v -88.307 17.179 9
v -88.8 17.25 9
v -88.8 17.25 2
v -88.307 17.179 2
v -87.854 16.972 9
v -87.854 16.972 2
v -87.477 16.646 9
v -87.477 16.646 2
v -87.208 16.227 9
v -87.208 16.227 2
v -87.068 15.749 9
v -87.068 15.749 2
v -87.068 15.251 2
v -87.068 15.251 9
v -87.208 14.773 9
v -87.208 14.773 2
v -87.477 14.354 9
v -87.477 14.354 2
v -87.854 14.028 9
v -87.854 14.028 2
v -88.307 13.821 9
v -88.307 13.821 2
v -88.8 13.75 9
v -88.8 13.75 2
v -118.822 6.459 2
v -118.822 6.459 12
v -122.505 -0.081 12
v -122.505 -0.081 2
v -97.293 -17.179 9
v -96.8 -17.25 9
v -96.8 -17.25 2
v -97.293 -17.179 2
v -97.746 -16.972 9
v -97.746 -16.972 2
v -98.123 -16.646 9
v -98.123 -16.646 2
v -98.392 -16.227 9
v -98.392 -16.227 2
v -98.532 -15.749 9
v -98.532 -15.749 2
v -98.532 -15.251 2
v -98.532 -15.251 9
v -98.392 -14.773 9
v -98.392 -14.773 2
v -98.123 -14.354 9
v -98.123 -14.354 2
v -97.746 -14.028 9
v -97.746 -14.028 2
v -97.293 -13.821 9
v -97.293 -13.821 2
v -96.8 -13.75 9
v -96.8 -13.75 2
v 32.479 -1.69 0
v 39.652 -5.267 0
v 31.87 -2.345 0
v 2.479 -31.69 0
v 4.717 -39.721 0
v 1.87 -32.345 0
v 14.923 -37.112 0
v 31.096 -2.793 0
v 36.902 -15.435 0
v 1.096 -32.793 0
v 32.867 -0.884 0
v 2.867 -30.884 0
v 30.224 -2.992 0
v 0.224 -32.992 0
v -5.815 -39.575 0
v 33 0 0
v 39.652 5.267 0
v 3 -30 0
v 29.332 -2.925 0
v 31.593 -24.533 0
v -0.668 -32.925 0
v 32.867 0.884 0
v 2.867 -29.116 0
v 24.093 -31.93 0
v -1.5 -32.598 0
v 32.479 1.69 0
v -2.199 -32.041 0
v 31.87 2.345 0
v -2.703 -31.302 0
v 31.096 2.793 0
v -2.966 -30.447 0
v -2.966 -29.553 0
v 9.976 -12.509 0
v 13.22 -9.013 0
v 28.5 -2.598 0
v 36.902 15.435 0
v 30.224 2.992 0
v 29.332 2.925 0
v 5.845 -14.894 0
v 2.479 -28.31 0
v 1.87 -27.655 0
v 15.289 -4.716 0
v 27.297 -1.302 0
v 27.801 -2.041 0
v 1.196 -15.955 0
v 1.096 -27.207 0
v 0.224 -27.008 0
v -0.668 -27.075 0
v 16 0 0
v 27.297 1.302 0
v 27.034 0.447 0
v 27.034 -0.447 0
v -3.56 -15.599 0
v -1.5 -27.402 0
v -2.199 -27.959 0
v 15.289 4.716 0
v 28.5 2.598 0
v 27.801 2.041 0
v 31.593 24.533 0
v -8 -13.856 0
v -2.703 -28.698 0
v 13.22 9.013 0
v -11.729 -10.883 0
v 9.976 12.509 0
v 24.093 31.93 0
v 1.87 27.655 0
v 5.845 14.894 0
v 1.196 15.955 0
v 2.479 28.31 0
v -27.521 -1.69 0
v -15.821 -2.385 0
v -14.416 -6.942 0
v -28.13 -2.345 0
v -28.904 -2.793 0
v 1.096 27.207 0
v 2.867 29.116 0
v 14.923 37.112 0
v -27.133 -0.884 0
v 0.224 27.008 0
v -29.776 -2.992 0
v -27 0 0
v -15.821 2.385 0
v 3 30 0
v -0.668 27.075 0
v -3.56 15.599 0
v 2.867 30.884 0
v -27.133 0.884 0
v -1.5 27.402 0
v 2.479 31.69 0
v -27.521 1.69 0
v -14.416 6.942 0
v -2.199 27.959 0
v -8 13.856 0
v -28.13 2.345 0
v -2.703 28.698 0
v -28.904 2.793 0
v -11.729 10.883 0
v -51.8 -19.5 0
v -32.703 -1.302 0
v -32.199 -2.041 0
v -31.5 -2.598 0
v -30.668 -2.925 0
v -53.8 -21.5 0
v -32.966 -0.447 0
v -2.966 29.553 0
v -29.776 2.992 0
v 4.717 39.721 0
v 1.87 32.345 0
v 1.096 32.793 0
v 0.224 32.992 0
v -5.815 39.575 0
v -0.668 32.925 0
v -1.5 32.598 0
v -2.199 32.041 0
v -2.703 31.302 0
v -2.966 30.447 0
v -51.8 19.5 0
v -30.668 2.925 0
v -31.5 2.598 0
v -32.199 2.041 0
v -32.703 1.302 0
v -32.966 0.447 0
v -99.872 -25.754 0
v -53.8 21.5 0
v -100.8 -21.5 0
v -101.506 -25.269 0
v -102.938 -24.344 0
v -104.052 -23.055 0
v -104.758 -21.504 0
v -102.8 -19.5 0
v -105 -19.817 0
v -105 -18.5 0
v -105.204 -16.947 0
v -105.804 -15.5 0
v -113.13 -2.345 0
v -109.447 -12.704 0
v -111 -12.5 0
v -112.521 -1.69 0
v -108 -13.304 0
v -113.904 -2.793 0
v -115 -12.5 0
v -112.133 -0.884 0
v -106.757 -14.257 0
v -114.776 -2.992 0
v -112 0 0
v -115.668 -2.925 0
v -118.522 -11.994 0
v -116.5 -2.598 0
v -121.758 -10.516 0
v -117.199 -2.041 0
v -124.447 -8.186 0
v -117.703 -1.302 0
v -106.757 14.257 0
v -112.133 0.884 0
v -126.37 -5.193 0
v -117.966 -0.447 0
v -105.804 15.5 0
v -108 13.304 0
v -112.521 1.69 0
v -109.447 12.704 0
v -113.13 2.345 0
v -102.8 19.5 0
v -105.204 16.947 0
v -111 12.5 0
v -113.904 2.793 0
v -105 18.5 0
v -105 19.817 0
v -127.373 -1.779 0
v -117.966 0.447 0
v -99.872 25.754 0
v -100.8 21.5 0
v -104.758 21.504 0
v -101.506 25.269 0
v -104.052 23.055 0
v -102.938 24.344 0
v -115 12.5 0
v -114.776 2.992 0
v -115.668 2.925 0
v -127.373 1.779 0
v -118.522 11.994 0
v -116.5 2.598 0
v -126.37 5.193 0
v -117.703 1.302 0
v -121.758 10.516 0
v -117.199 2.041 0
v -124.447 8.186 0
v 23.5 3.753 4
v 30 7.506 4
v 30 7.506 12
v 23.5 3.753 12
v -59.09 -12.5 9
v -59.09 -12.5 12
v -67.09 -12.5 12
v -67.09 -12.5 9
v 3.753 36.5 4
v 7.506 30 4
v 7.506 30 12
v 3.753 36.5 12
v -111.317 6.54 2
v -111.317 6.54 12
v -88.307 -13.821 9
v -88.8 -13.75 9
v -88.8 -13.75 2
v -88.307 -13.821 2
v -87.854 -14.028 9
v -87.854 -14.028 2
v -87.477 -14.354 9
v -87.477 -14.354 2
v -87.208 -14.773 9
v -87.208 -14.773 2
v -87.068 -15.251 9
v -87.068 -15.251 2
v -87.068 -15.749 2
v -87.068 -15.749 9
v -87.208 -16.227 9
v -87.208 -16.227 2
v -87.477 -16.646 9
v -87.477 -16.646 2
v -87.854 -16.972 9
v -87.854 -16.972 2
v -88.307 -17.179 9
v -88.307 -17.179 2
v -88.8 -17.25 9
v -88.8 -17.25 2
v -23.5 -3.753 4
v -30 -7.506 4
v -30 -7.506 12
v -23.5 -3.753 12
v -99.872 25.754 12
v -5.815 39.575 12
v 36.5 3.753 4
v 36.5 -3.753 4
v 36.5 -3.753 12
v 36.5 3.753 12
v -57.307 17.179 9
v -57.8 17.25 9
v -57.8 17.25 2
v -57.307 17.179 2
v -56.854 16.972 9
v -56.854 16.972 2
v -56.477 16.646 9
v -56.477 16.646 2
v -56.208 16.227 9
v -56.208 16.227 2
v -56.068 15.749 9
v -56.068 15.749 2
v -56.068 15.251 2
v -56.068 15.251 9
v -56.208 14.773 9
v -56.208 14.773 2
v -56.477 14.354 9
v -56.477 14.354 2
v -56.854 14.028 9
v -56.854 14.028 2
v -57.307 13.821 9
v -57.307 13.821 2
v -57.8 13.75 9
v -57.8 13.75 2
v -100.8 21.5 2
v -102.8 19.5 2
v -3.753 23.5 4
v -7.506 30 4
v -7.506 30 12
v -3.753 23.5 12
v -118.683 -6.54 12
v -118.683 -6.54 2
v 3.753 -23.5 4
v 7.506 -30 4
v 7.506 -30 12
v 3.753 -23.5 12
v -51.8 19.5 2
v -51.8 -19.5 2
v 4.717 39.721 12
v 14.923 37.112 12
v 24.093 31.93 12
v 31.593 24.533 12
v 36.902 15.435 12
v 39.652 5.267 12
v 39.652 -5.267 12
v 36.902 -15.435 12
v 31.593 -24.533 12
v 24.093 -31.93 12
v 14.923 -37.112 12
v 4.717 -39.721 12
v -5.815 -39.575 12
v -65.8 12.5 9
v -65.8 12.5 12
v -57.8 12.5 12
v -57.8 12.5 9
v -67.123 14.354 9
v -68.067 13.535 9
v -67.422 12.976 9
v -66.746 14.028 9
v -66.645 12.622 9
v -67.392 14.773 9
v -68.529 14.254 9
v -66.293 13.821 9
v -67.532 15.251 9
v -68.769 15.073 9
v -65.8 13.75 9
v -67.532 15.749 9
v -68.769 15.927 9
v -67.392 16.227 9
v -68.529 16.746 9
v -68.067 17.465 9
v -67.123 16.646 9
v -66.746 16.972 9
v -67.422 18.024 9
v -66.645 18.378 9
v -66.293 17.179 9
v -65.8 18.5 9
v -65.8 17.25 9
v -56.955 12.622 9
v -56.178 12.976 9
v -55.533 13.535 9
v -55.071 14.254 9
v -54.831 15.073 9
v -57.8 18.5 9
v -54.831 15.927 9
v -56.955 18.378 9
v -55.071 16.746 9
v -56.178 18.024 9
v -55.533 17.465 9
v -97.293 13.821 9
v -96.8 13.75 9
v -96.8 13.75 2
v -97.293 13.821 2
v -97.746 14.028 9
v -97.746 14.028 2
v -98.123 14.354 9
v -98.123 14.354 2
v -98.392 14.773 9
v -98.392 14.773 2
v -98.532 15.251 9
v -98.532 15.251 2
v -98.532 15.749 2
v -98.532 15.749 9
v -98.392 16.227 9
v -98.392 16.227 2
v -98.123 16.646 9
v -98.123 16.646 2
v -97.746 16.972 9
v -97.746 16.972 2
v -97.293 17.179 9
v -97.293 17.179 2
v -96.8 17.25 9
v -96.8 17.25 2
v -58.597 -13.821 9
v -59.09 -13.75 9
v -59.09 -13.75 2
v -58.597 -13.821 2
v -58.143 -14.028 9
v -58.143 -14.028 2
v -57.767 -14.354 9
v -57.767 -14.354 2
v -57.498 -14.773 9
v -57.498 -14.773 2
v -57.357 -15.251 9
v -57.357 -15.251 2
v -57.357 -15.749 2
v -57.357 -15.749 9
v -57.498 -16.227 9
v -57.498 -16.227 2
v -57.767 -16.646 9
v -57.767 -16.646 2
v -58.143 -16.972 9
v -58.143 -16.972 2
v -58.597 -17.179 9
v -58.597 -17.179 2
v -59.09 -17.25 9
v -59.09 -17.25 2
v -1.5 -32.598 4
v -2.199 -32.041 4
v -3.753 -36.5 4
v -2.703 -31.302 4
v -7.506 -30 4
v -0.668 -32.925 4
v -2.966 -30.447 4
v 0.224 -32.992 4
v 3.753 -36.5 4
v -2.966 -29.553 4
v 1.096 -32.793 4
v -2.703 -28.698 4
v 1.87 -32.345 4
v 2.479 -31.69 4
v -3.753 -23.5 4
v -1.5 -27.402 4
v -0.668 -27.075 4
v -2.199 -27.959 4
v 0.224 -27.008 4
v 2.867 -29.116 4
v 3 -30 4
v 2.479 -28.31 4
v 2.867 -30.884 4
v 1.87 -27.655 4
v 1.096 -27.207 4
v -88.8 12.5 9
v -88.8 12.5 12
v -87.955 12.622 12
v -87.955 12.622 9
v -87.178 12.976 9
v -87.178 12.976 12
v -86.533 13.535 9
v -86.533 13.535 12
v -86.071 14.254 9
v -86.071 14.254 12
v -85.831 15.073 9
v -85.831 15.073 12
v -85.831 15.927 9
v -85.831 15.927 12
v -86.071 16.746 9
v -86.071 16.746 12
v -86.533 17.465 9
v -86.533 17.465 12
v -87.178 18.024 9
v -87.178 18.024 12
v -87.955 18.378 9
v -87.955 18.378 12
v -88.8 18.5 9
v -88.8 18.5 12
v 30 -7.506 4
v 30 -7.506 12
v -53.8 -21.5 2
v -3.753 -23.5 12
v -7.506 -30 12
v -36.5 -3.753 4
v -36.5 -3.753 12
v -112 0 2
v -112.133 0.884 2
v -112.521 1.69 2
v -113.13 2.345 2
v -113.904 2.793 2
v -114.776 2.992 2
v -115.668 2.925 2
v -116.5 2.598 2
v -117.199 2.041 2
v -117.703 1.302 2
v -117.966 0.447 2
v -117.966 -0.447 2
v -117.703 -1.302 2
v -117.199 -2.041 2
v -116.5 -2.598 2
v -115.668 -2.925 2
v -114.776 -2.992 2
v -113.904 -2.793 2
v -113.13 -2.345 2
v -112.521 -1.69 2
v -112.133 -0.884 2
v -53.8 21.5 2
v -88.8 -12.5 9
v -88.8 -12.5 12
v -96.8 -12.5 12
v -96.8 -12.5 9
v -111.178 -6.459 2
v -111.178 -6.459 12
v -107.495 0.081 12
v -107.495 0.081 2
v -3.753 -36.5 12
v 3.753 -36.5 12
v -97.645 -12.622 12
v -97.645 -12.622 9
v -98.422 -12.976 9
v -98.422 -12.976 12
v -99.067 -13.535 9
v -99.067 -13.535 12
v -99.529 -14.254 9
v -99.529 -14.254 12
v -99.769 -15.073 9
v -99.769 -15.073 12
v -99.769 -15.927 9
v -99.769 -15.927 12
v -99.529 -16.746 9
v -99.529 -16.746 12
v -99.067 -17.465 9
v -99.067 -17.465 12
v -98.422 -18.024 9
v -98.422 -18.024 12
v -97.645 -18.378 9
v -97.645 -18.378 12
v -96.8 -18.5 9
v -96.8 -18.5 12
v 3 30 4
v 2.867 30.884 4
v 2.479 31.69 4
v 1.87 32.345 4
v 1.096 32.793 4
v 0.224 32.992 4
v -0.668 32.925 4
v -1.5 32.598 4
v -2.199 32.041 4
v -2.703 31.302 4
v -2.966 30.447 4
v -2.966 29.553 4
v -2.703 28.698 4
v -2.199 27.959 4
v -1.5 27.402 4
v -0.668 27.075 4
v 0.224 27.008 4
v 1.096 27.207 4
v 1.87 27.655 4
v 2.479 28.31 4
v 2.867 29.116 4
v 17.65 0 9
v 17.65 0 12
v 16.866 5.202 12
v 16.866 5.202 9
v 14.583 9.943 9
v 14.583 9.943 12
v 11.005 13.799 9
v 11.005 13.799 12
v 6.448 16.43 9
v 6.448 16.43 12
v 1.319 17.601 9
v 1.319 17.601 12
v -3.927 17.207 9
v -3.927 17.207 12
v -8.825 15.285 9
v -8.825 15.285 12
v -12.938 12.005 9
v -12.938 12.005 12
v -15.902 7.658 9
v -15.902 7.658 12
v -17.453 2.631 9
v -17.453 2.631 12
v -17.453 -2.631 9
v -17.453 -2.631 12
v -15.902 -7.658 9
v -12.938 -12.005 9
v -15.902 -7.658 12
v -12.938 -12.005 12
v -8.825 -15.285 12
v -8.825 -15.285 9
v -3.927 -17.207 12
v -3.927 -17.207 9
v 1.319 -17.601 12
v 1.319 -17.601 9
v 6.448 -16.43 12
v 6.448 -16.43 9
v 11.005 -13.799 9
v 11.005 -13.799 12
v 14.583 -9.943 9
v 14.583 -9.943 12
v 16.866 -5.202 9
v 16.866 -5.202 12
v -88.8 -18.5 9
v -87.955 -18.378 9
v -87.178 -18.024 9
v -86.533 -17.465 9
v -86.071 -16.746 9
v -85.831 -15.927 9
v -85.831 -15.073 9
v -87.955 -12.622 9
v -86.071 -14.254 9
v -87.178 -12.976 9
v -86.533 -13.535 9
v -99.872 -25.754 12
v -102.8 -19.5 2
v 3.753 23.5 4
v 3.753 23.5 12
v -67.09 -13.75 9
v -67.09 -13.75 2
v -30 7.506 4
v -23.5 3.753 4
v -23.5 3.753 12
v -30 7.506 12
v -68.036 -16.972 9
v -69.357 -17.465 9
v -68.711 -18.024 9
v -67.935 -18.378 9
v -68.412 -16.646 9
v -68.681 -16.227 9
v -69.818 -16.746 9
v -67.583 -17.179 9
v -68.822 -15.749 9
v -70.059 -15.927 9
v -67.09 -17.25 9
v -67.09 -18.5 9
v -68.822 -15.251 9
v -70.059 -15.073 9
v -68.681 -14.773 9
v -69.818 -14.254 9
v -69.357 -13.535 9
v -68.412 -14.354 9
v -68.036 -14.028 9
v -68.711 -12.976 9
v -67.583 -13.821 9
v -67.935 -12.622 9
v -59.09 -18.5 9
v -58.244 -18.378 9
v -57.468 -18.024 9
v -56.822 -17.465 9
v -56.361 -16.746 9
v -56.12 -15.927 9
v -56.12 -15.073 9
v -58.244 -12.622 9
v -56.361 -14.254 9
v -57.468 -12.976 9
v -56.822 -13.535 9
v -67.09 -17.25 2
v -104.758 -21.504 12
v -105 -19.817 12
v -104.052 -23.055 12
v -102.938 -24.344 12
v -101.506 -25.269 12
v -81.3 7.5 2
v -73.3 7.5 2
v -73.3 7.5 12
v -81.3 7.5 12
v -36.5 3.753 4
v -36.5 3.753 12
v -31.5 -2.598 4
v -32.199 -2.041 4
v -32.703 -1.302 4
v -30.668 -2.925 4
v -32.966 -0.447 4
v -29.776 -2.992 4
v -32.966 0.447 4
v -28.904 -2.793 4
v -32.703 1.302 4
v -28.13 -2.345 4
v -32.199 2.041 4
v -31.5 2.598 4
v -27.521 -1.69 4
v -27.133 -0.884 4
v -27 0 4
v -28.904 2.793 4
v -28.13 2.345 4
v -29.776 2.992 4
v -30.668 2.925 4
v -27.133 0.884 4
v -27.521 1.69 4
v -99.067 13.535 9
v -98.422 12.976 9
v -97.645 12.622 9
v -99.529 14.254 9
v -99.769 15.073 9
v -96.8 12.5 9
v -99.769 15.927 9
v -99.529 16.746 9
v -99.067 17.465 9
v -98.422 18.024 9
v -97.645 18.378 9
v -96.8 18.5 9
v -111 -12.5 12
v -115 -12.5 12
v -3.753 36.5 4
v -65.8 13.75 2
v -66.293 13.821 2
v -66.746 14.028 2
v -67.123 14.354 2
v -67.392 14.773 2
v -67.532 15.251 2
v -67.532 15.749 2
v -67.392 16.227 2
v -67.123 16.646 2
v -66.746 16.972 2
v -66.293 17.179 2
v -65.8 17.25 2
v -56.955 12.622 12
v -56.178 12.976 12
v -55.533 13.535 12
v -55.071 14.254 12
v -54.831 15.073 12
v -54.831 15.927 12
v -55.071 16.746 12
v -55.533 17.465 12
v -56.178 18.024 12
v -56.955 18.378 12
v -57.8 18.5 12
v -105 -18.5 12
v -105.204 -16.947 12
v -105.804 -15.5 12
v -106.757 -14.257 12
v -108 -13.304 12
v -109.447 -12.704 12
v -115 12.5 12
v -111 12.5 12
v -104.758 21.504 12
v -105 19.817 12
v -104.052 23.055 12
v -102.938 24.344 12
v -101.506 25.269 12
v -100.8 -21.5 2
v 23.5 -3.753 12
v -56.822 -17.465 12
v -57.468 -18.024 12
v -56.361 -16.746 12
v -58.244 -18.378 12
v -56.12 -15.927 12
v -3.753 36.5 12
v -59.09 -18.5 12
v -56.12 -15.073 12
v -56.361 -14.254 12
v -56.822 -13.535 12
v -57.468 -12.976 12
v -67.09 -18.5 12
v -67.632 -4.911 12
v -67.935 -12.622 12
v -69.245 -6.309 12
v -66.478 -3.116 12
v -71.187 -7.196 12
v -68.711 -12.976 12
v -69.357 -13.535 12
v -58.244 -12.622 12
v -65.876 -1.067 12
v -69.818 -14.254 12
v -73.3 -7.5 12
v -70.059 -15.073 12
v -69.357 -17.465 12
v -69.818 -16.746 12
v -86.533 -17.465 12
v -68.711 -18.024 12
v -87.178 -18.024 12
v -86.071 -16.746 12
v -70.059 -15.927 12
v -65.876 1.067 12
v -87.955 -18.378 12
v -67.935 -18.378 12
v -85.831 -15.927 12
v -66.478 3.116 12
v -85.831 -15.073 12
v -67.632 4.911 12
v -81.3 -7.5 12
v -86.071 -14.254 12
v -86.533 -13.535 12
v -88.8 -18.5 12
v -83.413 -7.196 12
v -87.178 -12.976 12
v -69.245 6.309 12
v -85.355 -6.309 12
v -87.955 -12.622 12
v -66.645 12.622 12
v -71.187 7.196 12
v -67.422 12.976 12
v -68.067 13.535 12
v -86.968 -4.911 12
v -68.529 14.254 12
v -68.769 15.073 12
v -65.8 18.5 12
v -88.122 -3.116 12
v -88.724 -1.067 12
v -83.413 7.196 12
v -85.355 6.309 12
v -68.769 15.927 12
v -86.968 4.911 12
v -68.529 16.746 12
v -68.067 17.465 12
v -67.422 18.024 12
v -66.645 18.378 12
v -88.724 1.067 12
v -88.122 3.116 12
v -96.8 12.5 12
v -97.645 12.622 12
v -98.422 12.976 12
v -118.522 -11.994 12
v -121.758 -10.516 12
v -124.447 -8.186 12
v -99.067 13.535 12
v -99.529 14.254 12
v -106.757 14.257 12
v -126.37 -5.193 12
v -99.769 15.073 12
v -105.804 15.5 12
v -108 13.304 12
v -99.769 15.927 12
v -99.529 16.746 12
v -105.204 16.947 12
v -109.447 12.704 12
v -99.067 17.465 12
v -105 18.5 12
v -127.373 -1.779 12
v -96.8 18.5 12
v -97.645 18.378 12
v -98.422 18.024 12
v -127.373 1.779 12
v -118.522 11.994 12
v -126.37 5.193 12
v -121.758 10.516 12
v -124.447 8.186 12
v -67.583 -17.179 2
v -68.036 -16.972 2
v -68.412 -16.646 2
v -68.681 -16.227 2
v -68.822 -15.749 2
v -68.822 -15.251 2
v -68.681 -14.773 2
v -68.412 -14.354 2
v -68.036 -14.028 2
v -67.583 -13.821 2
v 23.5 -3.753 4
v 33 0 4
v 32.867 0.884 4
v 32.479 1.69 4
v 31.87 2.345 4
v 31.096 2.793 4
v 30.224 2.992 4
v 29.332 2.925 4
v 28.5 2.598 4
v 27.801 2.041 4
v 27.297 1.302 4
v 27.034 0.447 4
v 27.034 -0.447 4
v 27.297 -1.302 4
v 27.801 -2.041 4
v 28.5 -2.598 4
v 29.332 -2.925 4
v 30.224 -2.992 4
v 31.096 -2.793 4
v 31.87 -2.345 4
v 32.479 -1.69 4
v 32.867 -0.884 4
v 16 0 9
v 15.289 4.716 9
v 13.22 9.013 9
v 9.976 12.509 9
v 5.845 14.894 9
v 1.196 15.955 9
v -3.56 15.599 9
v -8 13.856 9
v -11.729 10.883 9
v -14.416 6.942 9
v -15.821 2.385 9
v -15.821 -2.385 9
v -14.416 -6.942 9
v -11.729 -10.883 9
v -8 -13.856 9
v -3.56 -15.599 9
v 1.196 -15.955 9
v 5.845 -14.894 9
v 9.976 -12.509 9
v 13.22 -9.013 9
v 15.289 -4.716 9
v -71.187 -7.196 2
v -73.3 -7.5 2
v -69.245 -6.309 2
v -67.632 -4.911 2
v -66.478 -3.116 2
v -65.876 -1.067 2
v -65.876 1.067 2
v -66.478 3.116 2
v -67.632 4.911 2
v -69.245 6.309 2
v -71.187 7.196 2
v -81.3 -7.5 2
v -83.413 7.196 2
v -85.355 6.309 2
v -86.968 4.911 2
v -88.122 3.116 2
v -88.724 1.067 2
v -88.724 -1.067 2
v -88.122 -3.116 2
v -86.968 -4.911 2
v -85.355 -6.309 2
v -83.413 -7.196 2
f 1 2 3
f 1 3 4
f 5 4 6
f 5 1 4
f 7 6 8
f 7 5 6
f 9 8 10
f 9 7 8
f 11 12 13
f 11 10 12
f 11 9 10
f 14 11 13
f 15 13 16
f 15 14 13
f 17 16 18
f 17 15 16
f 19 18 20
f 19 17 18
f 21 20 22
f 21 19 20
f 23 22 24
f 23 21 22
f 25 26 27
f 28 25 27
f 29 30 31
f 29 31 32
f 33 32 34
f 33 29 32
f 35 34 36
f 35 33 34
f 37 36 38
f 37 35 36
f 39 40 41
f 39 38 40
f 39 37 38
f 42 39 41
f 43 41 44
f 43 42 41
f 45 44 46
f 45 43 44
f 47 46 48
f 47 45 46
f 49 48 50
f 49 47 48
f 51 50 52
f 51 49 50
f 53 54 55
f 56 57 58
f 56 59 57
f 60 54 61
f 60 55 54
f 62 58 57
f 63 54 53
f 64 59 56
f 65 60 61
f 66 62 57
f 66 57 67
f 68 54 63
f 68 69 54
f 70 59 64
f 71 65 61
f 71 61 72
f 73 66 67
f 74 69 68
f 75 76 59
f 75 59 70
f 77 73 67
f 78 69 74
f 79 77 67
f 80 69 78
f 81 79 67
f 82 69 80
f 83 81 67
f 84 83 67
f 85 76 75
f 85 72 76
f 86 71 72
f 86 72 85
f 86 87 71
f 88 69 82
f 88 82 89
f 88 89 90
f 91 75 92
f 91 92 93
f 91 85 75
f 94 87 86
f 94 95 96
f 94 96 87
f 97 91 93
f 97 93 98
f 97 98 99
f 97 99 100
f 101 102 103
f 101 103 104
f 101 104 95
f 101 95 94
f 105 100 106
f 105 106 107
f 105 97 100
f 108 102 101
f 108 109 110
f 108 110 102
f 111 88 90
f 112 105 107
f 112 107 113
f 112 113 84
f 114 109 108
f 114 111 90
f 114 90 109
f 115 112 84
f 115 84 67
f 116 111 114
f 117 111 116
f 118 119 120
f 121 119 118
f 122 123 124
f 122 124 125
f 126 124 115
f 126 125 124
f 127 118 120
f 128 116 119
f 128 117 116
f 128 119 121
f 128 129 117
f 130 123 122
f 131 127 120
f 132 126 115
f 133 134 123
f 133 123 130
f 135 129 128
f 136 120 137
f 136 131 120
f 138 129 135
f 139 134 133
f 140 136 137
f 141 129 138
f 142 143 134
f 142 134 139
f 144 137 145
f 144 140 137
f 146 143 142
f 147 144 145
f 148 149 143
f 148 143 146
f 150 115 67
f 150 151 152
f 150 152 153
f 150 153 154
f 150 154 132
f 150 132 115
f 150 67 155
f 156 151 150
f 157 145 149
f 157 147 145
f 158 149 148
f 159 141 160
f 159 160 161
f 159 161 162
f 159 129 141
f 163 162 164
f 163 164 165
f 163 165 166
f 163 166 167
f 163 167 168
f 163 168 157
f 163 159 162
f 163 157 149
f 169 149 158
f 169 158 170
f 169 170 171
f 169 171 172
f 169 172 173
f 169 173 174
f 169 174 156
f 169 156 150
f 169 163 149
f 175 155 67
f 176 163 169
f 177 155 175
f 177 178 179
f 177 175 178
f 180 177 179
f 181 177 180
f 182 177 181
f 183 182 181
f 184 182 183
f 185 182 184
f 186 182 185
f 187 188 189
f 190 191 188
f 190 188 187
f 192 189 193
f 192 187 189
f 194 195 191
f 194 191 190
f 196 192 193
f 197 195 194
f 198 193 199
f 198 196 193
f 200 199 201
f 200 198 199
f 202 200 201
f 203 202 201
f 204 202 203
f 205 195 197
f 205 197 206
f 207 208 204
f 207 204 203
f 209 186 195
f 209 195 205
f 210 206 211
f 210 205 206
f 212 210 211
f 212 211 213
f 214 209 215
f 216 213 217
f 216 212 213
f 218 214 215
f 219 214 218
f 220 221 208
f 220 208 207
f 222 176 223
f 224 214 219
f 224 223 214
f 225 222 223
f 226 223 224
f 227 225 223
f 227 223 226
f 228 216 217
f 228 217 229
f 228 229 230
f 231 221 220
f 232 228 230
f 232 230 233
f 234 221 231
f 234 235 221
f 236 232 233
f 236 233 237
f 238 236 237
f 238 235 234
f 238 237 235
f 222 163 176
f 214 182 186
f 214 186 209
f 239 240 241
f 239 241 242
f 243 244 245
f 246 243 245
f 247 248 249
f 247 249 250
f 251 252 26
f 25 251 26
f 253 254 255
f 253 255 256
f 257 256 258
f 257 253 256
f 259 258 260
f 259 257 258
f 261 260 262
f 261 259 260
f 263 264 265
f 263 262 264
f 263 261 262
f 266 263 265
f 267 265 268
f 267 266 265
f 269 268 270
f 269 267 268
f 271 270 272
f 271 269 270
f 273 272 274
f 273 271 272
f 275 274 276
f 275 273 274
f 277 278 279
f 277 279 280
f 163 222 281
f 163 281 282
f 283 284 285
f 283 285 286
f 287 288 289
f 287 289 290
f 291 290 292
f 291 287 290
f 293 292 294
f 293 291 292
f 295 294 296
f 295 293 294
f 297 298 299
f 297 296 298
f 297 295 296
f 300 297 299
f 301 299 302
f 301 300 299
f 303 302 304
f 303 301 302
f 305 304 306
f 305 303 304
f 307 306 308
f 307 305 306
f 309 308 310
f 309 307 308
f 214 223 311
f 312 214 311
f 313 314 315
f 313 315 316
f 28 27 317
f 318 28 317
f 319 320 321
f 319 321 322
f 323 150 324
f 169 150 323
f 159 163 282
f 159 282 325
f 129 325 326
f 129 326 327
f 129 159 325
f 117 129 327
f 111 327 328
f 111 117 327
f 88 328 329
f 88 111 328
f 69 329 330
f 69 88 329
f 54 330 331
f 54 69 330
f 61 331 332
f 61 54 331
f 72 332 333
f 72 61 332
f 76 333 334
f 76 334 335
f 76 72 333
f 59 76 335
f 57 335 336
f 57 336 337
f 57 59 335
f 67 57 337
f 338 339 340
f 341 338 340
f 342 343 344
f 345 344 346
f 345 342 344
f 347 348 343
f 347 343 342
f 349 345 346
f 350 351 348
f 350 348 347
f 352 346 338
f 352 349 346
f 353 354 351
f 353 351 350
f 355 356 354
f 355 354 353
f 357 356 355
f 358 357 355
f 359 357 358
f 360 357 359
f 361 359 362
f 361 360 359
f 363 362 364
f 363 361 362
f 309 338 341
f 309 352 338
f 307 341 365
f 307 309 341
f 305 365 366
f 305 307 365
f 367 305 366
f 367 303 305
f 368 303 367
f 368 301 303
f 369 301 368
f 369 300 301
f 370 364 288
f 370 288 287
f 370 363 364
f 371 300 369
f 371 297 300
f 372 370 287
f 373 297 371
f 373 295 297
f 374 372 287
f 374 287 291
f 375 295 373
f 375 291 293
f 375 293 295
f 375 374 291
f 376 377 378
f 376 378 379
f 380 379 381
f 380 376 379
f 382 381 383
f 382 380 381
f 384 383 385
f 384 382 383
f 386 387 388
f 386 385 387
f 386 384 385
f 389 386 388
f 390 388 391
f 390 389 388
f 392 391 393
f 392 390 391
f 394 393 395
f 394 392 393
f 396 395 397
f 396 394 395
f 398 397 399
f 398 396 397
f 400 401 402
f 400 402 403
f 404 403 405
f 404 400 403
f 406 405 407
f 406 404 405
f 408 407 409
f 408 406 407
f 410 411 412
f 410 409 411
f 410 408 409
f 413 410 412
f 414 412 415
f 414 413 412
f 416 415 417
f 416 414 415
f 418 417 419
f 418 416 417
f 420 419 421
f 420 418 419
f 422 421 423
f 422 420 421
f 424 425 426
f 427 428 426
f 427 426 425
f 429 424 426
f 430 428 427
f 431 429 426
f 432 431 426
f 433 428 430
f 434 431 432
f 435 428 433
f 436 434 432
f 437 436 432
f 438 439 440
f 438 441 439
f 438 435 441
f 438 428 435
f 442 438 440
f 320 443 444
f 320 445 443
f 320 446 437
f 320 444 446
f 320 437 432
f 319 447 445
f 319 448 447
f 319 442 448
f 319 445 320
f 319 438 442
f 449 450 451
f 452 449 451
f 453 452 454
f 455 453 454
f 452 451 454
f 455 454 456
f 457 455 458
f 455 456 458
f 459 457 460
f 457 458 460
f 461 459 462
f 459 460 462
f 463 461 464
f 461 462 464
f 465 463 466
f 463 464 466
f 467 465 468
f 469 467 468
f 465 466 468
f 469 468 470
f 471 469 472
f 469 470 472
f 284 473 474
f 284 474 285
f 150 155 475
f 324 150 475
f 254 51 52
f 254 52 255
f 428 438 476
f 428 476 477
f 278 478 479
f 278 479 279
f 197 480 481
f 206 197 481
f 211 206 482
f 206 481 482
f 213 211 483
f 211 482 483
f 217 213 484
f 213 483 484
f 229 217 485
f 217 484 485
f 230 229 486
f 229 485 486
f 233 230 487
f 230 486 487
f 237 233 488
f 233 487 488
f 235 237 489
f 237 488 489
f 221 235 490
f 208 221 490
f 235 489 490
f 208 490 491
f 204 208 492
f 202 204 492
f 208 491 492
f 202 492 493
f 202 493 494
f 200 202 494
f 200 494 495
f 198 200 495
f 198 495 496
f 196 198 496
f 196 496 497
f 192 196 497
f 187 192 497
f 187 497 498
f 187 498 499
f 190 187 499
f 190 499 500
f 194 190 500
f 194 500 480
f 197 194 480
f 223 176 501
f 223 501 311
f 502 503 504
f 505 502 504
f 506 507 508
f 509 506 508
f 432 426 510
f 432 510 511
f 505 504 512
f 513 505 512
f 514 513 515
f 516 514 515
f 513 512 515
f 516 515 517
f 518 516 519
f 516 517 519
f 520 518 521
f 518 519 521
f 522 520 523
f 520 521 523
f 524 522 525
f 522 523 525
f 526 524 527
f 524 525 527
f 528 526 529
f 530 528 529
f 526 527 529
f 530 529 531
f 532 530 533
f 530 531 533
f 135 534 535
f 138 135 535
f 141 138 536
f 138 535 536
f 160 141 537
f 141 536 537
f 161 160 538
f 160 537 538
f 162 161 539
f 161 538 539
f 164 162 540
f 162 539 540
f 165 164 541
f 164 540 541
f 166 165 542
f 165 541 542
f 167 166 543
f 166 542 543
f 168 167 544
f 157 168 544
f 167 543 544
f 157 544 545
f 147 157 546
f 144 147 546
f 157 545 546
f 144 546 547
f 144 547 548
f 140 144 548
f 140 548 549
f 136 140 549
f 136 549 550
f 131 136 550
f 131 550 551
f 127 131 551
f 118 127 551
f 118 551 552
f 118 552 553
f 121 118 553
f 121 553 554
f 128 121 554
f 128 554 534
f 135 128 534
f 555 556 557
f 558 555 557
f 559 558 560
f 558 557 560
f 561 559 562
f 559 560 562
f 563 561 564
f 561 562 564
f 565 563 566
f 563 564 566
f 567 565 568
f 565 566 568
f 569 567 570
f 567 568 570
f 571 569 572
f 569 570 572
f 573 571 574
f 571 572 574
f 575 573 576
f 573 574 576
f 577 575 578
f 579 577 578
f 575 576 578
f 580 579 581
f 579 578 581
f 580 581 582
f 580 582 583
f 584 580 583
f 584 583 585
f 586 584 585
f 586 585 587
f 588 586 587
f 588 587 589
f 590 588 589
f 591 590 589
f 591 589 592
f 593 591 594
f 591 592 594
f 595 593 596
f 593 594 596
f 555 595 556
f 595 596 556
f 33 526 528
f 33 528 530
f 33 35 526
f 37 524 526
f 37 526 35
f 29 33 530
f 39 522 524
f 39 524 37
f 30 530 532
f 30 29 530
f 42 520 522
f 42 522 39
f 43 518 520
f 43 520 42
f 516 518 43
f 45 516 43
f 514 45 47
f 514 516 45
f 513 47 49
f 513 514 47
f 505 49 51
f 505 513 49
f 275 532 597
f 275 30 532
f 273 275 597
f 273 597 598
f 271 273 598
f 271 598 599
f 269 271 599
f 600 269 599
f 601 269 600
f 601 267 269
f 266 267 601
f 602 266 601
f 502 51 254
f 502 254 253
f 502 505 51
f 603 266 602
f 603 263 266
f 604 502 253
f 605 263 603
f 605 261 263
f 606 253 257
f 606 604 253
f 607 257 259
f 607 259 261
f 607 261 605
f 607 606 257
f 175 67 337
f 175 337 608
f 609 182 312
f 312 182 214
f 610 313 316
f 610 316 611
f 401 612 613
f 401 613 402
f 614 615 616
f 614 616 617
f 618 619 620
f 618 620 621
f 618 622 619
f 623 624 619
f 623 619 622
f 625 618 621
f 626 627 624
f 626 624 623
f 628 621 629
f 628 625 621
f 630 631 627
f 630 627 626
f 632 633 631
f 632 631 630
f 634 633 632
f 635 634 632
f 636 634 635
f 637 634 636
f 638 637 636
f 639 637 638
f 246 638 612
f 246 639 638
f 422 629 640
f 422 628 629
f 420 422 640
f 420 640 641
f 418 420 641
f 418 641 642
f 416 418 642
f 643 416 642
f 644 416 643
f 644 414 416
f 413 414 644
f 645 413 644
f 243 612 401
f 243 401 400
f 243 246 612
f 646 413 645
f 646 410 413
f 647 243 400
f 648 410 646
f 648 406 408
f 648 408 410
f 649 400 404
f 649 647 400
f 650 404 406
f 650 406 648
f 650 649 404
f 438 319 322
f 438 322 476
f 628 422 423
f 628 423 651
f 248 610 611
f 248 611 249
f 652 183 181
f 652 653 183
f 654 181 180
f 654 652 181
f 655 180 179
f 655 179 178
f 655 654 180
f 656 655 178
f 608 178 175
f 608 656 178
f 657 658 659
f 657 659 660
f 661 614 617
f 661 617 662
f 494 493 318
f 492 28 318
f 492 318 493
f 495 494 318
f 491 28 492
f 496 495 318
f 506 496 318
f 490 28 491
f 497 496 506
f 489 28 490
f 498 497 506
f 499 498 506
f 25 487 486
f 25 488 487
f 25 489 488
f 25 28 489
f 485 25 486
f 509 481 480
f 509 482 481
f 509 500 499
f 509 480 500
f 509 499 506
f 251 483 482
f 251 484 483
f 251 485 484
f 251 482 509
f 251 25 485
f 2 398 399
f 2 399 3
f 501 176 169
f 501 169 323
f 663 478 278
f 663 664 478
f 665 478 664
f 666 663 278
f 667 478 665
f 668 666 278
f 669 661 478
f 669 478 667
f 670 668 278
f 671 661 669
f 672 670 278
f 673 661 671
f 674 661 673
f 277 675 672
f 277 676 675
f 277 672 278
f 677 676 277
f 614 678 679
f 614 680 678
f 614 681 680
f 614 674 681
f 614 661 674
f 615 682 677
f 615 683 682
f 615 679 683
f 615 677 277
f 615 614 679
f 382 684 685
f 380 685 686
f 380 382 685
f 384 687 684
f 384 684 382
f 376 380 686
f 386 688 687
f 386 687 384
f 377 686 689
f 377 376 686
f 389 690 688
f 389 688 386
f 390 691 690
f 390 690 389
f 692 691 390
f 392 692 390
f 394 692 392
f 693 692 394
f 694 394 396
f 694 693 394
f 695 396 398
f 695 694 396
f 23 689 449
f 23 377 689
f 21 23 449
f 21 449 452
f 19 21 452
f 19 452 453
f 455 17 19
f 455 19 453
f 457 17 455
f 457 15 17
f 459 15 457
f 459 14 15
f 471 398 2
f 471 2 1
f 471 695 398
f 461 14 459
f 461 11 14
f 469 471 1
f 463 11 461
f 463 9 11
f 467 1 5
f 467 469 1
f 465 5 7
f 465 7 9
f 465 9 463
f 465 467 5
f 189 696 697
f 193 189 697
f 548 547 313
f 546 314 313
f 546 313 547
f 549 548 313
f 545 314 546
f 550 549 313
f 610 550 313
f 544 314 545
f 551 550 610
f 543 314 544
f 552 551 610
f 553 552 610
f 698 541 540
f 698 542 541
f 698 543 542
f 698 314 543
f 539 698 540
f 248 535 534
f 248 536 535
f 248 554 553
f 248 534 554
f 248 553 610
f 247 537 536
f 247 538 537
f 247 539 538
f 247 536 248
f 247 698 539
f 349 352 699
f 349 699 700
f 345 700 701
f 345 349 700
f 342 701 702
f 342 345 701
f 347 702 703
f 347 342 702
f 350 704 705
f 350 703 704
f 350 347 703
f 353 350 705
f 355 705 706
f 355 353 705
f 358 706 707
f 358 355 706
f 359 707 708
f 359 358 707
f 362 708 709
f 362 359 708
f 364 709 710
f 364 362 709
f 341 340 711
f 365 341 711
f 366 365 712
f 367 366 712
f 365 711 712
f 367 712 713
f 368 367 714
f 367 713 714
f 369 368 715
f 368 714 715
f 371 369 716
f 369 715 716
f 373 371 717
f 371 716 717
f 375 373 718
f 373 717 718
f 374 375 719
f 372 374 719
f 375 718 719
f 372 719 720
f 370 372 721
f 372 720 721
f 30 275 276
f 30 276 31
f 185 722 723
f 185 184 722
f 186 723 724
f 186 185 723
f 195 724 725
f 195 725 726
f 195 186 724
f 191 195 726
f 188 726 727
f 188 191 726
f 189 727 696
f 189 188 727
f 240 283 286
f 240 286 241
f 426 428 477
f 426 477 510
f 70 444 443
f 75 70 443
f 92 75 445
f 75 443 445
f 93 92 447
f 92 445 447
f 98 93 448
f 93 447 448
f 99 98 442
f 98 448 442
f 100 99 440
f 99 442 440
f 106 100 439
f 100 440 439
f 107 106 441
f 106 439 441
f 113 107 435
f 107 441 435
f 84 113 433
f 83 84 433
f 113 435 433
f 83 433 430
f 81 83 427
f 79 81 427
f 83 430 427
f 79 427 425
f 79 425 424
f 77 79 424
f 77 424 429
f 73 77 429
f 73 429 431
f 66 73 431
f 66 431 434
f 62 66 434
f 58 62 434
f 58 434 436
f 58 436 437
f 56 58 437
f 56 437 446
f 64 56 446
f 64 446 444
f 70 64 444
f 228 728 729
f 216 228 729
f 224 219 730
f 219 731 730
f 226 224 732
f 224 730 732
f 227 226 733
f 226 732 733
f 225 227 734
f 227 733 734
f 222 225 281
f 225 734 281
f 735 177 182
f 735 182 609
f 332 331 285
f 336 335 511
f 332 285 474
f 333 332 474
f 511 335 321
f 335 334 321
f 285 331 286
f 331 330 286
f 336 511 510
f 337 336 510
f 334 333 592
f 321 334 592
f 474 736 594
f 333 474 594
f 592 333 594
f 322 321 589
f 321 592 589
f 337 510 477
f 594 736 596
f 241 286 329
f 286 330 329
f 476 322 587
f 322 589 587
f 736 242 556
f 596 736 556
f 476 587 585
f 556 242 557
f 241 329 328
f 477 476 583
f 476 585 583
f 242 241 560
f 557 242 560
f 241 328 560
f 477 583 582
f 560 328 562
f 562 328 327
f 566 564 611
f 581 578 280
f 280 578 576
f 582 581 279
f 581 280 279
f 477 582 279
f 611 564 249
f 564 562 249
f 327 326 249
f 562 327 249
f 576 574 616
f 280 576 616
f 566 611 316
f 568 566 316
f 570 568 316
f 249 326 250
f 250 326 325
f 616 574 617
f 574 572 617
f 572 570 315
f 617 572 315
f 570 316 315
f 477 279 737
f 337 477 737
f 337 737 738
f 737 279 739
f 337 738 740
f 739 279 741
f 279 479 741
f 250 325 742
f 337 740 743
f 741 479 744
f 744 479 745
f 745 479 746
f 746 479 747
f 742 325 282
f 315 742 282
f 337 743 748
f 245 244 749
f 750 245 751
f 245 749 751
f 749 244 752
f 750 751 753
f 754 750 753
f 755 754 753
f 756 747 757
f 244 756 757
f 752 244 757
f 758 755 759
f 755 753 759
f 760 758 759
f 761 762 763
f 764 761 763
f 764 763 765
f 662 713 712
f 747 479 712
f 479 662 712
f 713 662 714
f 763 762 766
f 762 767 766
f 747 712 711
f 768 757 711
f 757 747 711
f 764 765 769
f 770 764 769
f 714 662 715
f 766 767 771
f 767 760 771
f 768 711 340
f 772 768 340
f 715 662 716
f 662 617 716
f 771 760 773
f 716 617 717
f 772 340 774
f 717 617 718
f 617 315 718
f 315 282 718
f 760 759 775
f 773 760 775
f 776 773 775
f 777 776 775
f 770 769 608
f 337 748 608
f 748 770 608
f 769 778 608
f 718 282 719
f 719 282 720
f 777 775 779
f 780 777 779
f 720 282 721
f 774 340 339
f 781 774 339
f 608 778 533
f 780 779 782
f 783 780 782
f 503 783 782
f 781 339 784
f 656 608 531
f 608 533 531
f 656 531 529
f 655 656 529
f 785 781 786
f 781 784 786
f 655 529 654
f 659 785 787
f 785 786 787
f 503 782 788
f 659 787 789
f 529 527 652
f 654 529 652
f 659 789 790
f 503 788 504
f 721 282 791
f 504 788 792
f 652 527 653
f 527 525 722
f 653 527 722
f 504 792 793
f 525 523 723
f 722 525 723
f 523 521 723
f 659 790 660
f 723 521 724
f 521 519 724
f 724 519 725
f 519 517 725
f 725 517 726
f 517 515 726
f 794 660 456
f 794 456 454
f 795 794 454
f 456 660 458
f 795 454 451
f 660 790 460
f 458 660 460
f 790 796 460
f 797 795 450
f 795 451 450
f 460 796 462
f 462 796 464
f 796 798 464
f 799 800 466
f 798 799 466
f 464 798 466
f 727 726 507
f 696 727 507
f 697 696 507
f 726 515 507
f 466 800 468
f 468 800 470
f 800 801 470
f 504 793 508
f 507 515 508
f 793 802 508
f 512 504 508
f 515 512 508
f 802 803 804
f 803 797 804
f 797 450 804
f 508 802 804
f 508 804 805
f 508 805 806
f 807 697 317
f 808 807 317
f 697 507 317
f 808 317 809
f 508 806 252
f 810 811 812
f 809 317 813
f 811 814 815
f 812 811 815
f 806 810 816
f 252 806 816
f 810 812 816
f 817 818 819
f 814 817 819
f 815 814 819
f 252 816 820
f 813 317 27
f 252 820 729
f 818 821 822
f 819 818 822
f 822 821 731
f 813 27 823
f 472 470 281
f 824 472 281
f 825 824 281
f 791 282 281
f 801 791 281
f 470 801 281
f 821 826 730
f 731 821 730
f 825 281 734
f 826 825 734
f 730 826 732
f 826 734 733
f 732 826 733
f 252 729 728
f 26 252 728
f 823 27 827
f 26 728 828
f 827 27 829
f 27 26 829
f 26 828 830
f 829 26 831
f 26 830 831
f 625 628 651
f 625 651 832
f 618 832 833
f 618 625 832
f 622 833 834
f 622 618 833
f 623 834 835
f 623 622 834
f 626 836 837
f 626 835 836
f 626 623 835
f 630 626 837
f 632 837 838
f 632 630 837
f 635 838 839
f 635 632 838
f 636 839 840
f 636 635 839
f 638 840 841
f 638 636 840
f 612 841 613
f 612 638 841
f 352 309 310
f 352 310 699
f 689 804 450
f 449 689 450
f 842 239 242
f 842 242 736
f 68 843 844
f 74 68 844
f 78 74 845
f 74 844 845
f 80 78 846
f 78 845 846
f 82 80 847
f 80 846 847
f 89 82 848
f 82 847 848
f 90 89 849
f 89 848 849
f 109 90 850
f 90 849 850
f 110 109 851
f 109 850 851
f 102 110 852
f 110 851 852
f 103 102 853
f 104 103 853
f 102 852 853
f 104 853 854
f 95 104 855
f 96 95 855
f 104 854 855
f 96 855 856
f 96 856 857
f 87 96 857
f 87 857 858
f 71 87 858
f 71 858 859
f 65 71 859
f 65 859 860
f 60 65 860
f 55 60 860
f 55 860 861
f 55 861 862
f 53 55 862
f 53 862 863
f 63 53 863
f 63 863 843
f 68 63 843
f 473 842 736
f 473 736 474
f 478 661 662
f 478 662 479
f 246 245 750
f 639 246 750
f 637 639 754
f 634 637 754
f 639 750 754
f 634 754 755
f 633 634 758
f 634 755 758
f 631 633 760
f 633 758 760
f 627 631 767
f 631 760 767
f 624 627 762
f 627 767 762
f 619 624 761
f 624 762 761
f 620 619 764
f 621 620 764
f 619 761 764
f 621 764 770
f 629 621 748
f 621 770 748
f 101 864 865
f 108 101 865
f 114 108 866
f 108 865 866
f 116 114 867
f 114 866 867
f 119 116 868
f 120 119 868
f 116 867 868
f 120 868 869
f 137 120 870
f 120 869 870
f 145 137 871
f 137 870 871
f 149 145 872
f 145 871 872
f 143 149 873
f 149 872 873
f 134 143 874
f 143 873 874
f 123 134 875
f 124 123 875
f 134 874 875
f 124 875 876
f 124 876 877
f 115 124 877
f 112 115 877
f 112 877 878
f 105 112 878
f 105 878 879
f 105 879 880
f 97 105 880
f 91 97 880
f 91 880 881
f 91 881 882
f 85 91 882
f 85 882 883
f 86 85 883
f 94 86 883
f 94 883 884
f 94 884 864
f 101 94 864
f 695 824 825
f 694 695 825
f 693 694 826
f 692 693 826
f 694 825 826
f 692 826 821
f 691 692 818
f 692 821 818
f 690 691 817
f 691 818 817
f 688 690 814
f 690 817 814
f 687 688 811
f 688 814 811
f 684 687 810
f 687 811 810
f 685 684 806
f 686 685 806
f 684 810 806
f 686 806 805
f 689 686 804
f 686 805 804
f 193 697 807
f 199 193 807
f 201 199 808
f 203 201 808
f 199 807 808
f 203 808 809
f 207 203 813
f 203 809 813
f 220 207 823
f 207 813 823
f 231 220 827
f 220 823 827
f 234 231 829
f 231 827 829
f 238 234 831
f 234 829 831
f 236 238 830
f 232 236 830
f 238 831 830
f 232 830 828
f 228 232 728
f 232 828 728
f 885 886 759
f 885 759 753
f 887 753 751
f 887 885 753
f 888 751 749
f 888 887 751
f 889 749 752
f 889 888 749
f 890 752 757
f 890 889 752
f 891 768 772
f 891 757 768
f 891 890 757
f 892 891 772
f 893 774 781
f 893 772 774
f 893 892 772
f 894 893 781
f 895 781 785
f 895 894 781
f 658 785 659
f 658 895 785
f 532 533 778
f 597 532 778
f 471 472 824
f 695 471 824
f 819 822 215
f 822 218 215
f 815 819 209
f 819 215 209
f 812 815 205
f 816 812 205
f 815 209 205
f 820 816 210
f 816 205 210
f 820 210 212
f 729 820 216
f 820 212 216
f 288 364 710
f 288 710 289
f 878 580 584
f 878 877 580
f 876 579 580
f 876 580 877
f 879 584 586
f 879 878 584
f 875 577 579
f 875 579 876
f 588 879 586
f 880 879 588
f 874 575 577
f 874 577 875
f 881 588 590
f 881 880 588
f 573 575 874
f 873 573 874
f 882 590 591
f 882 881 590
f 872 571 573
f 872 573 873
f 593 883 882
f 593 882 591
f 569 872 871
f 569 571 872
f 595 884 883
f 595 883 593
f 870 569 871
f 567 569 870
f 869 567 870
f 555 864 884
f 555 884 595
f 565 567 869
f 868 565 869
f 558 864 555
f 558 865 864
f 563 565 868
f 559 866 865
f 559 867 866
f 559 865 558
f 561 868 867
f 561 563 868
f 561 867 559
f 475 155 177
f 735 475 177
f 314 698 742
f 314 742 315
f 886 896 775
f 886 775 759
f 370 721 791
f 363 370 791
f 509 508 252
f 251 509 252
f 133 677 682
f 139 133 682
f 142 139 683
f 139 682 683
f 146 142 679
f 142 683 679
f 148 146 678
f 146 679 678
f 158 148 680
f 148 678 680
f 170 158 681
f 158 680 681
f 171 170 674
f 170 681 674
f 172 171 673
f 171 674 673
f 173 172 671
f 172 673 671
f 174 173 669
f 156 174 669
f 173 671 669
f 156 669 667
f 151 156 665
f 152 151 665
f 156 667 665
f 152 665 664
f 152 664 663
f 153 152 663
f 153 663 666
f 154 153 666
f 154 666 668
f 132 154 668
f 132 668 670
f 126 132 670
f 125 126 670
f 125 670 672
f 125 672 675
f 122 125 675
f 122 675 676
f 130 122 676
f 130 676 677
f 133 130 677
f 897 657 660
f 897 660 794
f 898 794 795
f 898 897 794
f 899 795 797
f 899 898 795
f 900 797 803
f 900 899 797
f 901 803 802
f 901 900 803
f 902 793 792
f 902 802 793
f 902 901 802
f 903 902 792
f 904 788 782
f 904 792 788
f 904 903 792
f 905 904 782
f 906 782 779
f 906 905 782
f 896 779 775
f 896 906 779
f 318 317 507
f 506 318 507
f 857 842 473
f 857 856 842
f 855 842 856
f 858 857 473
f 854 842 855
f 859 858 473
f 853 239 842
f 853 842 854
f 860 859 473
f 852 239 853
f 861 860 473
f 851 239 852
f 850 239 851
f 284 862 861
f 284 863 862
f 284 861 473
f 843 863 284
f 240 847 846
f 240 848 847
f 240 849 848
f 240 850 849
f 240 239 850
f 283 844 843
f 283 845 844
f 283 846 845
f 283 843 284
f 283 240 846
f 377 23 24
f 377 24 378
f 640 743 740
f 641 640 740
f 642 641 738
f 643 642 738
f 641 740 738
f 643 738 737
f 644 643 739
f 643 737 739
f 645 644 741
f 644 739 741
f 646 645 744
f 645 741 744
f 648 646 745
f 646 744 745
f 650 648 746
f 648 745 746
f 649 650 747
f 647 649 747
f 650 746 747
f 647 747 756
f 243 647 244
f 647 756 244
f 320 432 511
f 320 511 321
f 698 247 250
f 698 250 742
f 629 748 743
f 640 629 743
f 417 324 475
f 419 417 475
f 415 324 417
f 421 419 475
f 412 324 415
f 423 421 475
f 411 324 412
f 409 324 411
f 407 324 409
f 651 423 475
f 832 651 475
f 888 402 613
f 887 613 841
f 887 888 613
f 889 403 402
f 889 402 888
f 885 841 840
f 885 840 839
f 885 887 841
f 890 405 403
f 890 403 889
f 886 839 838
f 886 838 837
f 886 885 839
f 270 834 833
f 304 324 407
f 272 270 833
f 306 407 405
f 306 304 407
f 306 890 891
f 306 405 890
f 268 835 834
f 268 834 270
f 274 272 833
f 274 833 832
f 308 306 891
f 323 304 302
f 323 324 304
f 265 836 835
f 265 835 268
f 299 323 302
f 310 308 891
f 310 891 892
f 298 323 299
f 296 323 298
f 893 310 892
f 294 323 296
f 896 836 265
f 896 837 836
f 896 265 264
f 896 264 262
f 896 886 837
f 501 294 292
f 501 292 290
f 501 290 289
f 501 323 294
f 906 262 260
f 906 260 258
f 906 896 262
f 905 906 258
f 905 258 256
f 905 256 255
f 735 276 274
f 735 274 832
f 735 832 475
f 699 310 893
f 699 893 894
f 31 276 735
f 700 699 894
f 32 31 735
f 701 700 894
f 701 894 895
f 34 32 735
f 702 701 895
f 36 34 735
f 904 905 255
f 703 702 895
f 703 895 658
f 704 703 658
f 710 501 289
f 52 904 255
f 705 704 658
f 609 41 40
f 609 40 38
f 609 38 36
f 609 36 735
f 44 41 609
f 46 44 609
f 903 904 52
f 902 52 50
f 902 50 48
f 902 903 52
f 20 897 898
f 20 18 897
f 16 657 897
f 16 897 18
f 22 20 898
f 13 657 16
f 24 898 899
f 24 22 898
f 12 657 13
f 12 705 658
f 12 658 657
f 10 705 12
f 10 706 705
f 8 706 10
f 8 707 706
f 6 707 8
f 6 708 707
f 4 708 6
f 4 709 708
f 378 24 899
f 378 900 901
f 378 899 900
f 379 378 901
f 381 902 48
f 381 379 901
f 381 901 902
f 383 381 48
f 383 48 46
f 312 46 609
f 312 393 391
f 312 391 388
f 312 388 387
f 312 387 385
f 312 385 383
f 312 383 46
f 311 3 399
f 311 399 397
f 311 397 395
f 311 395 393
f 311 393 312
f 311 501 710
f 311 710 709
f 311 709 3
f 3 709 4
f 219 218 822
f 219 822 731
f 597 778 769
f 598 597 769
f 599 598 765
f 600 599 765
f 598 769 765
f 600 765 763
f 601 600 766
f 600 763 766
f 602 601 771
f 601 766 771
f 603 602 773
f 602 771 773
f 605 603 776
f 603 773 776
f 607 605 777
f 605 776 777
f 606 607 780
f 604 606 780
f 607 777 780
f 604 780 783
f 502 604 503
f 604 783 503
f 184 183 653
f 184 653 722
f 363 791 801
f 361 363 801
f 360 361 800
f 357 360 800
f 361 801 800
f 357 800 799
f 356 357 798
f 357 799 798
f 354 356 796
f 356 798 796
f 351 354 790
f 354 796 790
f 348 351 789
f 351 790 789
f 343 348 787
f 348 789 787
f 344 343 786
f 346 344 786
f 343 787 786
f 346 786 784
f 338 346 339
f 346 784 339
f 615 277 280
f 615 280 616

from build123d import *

# Parameters (mm, degrees)
SKETCH2_R               = 10
BOSS_EXTRUDE1_DEPTH     = 12
SKETCH3_R               = 17.65
CUT_EXTRUDE1_DEPTH      = 3
CUT_EXTRUDE2_DEPTH      = 114
CUT_EXTRUDE2_DEPTH_BACK = 114
SKETCH5_R               = 3
CUT_EXTRUDE3_DEPTH      = 114
SKETCH6_R               = 16
CUT_EXTRUDE4_DEPTH      = 113.720894248
SKETCH7_W               = 51
SKETCH7_H               = 43
CUT_EXTRUDE5_DEPTH      = 2
CHAMFER1_SIZE           = 2
CUT_EXTRUDE6_DEPTH      = 8
CUT_EXTRUDE7_DEPTH      = 3
CUT_EXTRUDE8_DEPTH      = 113.720894248
SKETCH11_R              = 3
BOSS_EXTRUDE2_DEPTH     = 12
FILLET1_R               = 6
CUT_EXTRUDE9_DEPTH      = 10


with BuildPart() as part:
    # Sketch2 → Boss-Extrude1 (new body)
    with BuildSketch(Plane.XY):
        with BuildLine():
            Line((-105, -25), (-105, 25))
            Line((-105, 25), (-5.815477401, 39.574994916))
            ThreePointArc((-5.815477401, 39.574994916), (40, 0), (-5.815477401, -39.574994916))
            Line((-5.815477401, -39.574994916), (-105, -25))
        make_face()
        Circle(SKETCH2_R, mode=Mode.SUBTRACT)
    extrude(amount=BOSS_EXTRUDE1_DEPTH)

    # Sketch3 → Cut-Extrude1 (cut)
    with BuildSketch(Plane.XY.offset(12)):
        Circle(SKETCH3_R)
    extrude(amount=-CUT_EXTRUDE1_DEPTH, mode=Mode.SUBTRACT)

    # Sketch4 → Cut-Extrude2 (cut, two sides: drawn at the far end of the back side and taken through both)
    with BuildSketch(Plane.XY.offset(12).offset(-CUT_EXTRUDE2_DEPTH_BACK)):
        with BuildLine():
            Line((-73.3, 7.5), (-81.3, 7.5))
            ThreePointArc((-81.3, 7.5), (-88.8, 0), (-81.3, -7.5))
            Line((-81.3, -7.5), (-73.3, -7.5))
            ThreePointArc((-73.3, -7.5), (-65.8, 0), (-73.3, 7.5))
        make_face()
    extrude(amount=CUT_EXTRUDE2_DEPTH + CUT_EXTRUDE2_DEPTH_BACK, mode=Mode.SUBTRACT)

    # Sketch5 → Cut-Extrude3 (cut, through all)
    with BuildSketch(Plane.XY.offset(12)):
        with Locations((30, 0)):
            Circle(SKETCH5_R)
        with Locations((0, -30)):
            Circle(SKETCH5_R)
        with Locations((-30, 0)):
            Circle(SKETCH5_R)
        with Locations((0, 30)):
            Circle(SKETCH5_R)
    extrude(amount=-CUT_EXTRUDE3_DEPTH, mode=Mode.SUBTRACT)

    # Sketch6 → Cut-Extrude4 (cut, through all)
    with BuildSketch(Plane.XY.offset(9)):
        Circle(SKETCH6_R)
    extrude(amount=-CUT_EXTRUDE4_DEPTH, mode=Mode.SUBTRACT)

    # Sketch7 → Cut-Extrude5 (cut)
    with BuildSketch(Plane(origin=(0, 0, 0), x_dir=(-1, 0, 0), z_dir=(0, 0, -1))):
        with Locations((77.3, 0)):
            Rectangle(SKETCH7_W, SKETCH7_H)
    extrude(amount=-CUT_EXTRUDE5_DEPTH, mode=Mode.SUBTRACT)

    # Chamfer1
    chamfer1_edges = [part.edges().sort_by_distance(p)[0] for p in [
        (-102.8, 21.5, 1),
        (-102.8, -21.5, 1),
        (-51.8, -21.5, 1),
        (-51.8, 21.5, 1),
    ]]
    chamfer(chamfer1_edges, length=CHAMFER1_SIZE)

    # Sketch8 → Cut-Extrude6 (cut)
    with BuildSketch(Plane.XY.offset(12)):
        Polygon((30, -7.505553499), (36.5, -3.75277675), (36.5, 3.75277675), (30, 7.505553499), (23.5, 3.75277675), (23.5, -3.75277675), align=None)
        Polygon((7.505553499, 30), (3.75277675, 36.5), (-3.75277675, 36.5), (-7.505553499, 30), (-3.75277675, 23.5), (3.75277675, 23.5), align=None)
        Polygon((-7.505553499, -30), (-3.75277675, -36.5), (3.75277675, -36.5), (7.505553499, -30), (3.75277675, -23.5), (-3.75277675, -23.5), align=None)
        Polygon((-30, 7.505553499), (-36.5, 3.75277675), (-36.5, -3.75277675), (-30, -7.505553499), (-23.5, -3.75277675), (-23.5, 3.75277675), align=None)
    extrude(amount=-CUT_EXTRUDE6_DEPTH, mode=Mode.SUBTRACT)

    # Sketch9 → Cut-Extrude7 (cut)
    with BuildSketch(Plane.XY.offset(12)):
        with BuildLine():
            Line((-65.8, 12.5), (-57.8, 12.5))
            ThreePointArc((-57.8, 12.5), (-54.8, 15.5), (-57.8, 18.5))
            Line((-57.8, 18.5), (-65.8, 18.5))
            ThreePointArc((-65.8, 18.5), (-68.8, 15.5), (-65.8, 12.5))
        make_face()
        with BuildLine():
            Line((-88.8, 18.5), (-96.8, 18.5))
            ThreePointArc((-96.8, 18.5), (-99.8, 15.5), (-96.8, 12.5))
            Line((-96.8, 12.5), (-88.8, 12.5))
            ThreePointArc((-88.8, 12.5), (-85.8, 15.5), (-88.8, 18.5))
        make_face()
        with BuildLine():
            Line((-59.089545502, -12.5), (-67.089545502, -12.5))
            ThreePointArc((-67.089545502, -12.5), (-70.089545502, -15.5), (-67.089545502, -18.5))
            Line((-67.089545502, -18.5), (-59.089545502, -18.5))
            ThreePointArc((-59.089545502, -18.5), (-56.089545502, -15.5), (-59.089545502, -12.5))
        make_face()
        with BuildLine():
            Line((-88.8, -12.5), (-96.8, -12.5))
            ThreePointArc((-96.8, -12.5), (-99.8, -15.5), (-96.8, -18.5))
            Line((-96.8, -18.5), (-88.8, -18.5))
            ThreePointArc((-88.8, -18.5), (-85.8, -15.5), (-88.8, -12.5))
        make_face()
    extrude(amount=-CUT_EXTRUDE7_DEPTH, mode=Mode.SUBTRACT)

    # Sketch10 → Cut-Extrude8 (cut, through all)
    with BuildSketch(Plane.XY.offset(9)):
        with BuildLine():
            Line((-67.089545502, -13.75), (-59.089545502, -13.75))
            ThreePointArc((-59.089545502, -13.75), (-57.339545502, -15.5), (-59.089545502, -17.25))
            Line((-59.089545502, -17.25), (-67.089545502, -17.25))
            ThreePointArc((-67.089545502, -17.25), (-68.839545502, -15.5), (-67.089545502, -13.75))
        make_face()
        with BuildLine():
            Line((-65.8, 17.25), (-57.8, 17.25))
            ThreePointArc((-57.8, 17.25), (-56.05, 15.5), (-57.8, 13.75))
            Line((-57.8, 13.75), (-65.8, 13.75))
            ThreePointArc((-65.8, 13.75), (-67.55, 15.5), (-65.8, 17.25))
        make_face()
        with BuildLine():
            Line((-96.8, 17.25), (-88.8, 17.25))
            ThreePointArc((-88.8, 17.25), (-87.05, 15.5), (-88.8, 13.75))
            Line((-88.8, 13.75), (-96.8, 13.75))
            ThreePointArc((-96.8, 13.75), (-98.55, 15.5), (-96.8, 17.25))
        make_face()
        with BuildLine():
            Line((-96.8, -13.75), (-88.8, -13.75))
            ThreePointArc((-88.8, -13.75), (-87.05, -15.5), (-88.8, -17.25))
            Line((-88.8, -17.25), (-96.8, -17.25))
            ThreePointArc((-96.8, -17.25), (-98.55, -15.5), (-96.8, -13.75))
        make_face()
    extrude(amount=-CUT_EXTRUDE8_DEPTH, mode=Mode.SUBTRACT)

    # Sketch11 → Boss-Extrude2 (add)
    with BuildSketch(Plane.XY.offset(12)):
        with BuildLine():
            Line((-115, 12.5), (-105, 12.5))
            Line((-105, 12.5), (-105, -12.5))
            Line((-105, -12.5), (-115, -12.5))
            ThreePointArc((-115, -12.5), (-127.5, 0), (-115, 12.5))
        make_face()
        with Locations((-115, 0)):
            Circle(SKETCH11_R, mode=Mode.SUBTRACT)
    extrude(amount=-BOSS_EXTRUDE2_DEPTH)

    # Fillet1
    fillet1_edges = [part.edges().sort_by_distance(p)[0] for p in [
        (-105, -12.5, 6),
        (-105, 12.5, 6),
        (-105, -25, 6),
        (-105, 25, 6),
    ]]
    fillet(fillet1_edges, radius=FILLET1_R)

    # Sketch12 → Cut-Extrude9 (cut)
    with BuildSketch(Plane.XY.offset(12)):
        Polygon((-111.317344252, 6.539983179), (-118.822463699, 6.45926502), (-122.505119447, -0.080718159), (-118.682655748, -6.539983179), (-111.177536301, -6.45926502), (-107.494880553, 0.080718159), align=None)
    extrude(amount=-CUT_EXTRUDE9_DEPTH, mode=Mode.SUBTRACT)


solid = part.part
